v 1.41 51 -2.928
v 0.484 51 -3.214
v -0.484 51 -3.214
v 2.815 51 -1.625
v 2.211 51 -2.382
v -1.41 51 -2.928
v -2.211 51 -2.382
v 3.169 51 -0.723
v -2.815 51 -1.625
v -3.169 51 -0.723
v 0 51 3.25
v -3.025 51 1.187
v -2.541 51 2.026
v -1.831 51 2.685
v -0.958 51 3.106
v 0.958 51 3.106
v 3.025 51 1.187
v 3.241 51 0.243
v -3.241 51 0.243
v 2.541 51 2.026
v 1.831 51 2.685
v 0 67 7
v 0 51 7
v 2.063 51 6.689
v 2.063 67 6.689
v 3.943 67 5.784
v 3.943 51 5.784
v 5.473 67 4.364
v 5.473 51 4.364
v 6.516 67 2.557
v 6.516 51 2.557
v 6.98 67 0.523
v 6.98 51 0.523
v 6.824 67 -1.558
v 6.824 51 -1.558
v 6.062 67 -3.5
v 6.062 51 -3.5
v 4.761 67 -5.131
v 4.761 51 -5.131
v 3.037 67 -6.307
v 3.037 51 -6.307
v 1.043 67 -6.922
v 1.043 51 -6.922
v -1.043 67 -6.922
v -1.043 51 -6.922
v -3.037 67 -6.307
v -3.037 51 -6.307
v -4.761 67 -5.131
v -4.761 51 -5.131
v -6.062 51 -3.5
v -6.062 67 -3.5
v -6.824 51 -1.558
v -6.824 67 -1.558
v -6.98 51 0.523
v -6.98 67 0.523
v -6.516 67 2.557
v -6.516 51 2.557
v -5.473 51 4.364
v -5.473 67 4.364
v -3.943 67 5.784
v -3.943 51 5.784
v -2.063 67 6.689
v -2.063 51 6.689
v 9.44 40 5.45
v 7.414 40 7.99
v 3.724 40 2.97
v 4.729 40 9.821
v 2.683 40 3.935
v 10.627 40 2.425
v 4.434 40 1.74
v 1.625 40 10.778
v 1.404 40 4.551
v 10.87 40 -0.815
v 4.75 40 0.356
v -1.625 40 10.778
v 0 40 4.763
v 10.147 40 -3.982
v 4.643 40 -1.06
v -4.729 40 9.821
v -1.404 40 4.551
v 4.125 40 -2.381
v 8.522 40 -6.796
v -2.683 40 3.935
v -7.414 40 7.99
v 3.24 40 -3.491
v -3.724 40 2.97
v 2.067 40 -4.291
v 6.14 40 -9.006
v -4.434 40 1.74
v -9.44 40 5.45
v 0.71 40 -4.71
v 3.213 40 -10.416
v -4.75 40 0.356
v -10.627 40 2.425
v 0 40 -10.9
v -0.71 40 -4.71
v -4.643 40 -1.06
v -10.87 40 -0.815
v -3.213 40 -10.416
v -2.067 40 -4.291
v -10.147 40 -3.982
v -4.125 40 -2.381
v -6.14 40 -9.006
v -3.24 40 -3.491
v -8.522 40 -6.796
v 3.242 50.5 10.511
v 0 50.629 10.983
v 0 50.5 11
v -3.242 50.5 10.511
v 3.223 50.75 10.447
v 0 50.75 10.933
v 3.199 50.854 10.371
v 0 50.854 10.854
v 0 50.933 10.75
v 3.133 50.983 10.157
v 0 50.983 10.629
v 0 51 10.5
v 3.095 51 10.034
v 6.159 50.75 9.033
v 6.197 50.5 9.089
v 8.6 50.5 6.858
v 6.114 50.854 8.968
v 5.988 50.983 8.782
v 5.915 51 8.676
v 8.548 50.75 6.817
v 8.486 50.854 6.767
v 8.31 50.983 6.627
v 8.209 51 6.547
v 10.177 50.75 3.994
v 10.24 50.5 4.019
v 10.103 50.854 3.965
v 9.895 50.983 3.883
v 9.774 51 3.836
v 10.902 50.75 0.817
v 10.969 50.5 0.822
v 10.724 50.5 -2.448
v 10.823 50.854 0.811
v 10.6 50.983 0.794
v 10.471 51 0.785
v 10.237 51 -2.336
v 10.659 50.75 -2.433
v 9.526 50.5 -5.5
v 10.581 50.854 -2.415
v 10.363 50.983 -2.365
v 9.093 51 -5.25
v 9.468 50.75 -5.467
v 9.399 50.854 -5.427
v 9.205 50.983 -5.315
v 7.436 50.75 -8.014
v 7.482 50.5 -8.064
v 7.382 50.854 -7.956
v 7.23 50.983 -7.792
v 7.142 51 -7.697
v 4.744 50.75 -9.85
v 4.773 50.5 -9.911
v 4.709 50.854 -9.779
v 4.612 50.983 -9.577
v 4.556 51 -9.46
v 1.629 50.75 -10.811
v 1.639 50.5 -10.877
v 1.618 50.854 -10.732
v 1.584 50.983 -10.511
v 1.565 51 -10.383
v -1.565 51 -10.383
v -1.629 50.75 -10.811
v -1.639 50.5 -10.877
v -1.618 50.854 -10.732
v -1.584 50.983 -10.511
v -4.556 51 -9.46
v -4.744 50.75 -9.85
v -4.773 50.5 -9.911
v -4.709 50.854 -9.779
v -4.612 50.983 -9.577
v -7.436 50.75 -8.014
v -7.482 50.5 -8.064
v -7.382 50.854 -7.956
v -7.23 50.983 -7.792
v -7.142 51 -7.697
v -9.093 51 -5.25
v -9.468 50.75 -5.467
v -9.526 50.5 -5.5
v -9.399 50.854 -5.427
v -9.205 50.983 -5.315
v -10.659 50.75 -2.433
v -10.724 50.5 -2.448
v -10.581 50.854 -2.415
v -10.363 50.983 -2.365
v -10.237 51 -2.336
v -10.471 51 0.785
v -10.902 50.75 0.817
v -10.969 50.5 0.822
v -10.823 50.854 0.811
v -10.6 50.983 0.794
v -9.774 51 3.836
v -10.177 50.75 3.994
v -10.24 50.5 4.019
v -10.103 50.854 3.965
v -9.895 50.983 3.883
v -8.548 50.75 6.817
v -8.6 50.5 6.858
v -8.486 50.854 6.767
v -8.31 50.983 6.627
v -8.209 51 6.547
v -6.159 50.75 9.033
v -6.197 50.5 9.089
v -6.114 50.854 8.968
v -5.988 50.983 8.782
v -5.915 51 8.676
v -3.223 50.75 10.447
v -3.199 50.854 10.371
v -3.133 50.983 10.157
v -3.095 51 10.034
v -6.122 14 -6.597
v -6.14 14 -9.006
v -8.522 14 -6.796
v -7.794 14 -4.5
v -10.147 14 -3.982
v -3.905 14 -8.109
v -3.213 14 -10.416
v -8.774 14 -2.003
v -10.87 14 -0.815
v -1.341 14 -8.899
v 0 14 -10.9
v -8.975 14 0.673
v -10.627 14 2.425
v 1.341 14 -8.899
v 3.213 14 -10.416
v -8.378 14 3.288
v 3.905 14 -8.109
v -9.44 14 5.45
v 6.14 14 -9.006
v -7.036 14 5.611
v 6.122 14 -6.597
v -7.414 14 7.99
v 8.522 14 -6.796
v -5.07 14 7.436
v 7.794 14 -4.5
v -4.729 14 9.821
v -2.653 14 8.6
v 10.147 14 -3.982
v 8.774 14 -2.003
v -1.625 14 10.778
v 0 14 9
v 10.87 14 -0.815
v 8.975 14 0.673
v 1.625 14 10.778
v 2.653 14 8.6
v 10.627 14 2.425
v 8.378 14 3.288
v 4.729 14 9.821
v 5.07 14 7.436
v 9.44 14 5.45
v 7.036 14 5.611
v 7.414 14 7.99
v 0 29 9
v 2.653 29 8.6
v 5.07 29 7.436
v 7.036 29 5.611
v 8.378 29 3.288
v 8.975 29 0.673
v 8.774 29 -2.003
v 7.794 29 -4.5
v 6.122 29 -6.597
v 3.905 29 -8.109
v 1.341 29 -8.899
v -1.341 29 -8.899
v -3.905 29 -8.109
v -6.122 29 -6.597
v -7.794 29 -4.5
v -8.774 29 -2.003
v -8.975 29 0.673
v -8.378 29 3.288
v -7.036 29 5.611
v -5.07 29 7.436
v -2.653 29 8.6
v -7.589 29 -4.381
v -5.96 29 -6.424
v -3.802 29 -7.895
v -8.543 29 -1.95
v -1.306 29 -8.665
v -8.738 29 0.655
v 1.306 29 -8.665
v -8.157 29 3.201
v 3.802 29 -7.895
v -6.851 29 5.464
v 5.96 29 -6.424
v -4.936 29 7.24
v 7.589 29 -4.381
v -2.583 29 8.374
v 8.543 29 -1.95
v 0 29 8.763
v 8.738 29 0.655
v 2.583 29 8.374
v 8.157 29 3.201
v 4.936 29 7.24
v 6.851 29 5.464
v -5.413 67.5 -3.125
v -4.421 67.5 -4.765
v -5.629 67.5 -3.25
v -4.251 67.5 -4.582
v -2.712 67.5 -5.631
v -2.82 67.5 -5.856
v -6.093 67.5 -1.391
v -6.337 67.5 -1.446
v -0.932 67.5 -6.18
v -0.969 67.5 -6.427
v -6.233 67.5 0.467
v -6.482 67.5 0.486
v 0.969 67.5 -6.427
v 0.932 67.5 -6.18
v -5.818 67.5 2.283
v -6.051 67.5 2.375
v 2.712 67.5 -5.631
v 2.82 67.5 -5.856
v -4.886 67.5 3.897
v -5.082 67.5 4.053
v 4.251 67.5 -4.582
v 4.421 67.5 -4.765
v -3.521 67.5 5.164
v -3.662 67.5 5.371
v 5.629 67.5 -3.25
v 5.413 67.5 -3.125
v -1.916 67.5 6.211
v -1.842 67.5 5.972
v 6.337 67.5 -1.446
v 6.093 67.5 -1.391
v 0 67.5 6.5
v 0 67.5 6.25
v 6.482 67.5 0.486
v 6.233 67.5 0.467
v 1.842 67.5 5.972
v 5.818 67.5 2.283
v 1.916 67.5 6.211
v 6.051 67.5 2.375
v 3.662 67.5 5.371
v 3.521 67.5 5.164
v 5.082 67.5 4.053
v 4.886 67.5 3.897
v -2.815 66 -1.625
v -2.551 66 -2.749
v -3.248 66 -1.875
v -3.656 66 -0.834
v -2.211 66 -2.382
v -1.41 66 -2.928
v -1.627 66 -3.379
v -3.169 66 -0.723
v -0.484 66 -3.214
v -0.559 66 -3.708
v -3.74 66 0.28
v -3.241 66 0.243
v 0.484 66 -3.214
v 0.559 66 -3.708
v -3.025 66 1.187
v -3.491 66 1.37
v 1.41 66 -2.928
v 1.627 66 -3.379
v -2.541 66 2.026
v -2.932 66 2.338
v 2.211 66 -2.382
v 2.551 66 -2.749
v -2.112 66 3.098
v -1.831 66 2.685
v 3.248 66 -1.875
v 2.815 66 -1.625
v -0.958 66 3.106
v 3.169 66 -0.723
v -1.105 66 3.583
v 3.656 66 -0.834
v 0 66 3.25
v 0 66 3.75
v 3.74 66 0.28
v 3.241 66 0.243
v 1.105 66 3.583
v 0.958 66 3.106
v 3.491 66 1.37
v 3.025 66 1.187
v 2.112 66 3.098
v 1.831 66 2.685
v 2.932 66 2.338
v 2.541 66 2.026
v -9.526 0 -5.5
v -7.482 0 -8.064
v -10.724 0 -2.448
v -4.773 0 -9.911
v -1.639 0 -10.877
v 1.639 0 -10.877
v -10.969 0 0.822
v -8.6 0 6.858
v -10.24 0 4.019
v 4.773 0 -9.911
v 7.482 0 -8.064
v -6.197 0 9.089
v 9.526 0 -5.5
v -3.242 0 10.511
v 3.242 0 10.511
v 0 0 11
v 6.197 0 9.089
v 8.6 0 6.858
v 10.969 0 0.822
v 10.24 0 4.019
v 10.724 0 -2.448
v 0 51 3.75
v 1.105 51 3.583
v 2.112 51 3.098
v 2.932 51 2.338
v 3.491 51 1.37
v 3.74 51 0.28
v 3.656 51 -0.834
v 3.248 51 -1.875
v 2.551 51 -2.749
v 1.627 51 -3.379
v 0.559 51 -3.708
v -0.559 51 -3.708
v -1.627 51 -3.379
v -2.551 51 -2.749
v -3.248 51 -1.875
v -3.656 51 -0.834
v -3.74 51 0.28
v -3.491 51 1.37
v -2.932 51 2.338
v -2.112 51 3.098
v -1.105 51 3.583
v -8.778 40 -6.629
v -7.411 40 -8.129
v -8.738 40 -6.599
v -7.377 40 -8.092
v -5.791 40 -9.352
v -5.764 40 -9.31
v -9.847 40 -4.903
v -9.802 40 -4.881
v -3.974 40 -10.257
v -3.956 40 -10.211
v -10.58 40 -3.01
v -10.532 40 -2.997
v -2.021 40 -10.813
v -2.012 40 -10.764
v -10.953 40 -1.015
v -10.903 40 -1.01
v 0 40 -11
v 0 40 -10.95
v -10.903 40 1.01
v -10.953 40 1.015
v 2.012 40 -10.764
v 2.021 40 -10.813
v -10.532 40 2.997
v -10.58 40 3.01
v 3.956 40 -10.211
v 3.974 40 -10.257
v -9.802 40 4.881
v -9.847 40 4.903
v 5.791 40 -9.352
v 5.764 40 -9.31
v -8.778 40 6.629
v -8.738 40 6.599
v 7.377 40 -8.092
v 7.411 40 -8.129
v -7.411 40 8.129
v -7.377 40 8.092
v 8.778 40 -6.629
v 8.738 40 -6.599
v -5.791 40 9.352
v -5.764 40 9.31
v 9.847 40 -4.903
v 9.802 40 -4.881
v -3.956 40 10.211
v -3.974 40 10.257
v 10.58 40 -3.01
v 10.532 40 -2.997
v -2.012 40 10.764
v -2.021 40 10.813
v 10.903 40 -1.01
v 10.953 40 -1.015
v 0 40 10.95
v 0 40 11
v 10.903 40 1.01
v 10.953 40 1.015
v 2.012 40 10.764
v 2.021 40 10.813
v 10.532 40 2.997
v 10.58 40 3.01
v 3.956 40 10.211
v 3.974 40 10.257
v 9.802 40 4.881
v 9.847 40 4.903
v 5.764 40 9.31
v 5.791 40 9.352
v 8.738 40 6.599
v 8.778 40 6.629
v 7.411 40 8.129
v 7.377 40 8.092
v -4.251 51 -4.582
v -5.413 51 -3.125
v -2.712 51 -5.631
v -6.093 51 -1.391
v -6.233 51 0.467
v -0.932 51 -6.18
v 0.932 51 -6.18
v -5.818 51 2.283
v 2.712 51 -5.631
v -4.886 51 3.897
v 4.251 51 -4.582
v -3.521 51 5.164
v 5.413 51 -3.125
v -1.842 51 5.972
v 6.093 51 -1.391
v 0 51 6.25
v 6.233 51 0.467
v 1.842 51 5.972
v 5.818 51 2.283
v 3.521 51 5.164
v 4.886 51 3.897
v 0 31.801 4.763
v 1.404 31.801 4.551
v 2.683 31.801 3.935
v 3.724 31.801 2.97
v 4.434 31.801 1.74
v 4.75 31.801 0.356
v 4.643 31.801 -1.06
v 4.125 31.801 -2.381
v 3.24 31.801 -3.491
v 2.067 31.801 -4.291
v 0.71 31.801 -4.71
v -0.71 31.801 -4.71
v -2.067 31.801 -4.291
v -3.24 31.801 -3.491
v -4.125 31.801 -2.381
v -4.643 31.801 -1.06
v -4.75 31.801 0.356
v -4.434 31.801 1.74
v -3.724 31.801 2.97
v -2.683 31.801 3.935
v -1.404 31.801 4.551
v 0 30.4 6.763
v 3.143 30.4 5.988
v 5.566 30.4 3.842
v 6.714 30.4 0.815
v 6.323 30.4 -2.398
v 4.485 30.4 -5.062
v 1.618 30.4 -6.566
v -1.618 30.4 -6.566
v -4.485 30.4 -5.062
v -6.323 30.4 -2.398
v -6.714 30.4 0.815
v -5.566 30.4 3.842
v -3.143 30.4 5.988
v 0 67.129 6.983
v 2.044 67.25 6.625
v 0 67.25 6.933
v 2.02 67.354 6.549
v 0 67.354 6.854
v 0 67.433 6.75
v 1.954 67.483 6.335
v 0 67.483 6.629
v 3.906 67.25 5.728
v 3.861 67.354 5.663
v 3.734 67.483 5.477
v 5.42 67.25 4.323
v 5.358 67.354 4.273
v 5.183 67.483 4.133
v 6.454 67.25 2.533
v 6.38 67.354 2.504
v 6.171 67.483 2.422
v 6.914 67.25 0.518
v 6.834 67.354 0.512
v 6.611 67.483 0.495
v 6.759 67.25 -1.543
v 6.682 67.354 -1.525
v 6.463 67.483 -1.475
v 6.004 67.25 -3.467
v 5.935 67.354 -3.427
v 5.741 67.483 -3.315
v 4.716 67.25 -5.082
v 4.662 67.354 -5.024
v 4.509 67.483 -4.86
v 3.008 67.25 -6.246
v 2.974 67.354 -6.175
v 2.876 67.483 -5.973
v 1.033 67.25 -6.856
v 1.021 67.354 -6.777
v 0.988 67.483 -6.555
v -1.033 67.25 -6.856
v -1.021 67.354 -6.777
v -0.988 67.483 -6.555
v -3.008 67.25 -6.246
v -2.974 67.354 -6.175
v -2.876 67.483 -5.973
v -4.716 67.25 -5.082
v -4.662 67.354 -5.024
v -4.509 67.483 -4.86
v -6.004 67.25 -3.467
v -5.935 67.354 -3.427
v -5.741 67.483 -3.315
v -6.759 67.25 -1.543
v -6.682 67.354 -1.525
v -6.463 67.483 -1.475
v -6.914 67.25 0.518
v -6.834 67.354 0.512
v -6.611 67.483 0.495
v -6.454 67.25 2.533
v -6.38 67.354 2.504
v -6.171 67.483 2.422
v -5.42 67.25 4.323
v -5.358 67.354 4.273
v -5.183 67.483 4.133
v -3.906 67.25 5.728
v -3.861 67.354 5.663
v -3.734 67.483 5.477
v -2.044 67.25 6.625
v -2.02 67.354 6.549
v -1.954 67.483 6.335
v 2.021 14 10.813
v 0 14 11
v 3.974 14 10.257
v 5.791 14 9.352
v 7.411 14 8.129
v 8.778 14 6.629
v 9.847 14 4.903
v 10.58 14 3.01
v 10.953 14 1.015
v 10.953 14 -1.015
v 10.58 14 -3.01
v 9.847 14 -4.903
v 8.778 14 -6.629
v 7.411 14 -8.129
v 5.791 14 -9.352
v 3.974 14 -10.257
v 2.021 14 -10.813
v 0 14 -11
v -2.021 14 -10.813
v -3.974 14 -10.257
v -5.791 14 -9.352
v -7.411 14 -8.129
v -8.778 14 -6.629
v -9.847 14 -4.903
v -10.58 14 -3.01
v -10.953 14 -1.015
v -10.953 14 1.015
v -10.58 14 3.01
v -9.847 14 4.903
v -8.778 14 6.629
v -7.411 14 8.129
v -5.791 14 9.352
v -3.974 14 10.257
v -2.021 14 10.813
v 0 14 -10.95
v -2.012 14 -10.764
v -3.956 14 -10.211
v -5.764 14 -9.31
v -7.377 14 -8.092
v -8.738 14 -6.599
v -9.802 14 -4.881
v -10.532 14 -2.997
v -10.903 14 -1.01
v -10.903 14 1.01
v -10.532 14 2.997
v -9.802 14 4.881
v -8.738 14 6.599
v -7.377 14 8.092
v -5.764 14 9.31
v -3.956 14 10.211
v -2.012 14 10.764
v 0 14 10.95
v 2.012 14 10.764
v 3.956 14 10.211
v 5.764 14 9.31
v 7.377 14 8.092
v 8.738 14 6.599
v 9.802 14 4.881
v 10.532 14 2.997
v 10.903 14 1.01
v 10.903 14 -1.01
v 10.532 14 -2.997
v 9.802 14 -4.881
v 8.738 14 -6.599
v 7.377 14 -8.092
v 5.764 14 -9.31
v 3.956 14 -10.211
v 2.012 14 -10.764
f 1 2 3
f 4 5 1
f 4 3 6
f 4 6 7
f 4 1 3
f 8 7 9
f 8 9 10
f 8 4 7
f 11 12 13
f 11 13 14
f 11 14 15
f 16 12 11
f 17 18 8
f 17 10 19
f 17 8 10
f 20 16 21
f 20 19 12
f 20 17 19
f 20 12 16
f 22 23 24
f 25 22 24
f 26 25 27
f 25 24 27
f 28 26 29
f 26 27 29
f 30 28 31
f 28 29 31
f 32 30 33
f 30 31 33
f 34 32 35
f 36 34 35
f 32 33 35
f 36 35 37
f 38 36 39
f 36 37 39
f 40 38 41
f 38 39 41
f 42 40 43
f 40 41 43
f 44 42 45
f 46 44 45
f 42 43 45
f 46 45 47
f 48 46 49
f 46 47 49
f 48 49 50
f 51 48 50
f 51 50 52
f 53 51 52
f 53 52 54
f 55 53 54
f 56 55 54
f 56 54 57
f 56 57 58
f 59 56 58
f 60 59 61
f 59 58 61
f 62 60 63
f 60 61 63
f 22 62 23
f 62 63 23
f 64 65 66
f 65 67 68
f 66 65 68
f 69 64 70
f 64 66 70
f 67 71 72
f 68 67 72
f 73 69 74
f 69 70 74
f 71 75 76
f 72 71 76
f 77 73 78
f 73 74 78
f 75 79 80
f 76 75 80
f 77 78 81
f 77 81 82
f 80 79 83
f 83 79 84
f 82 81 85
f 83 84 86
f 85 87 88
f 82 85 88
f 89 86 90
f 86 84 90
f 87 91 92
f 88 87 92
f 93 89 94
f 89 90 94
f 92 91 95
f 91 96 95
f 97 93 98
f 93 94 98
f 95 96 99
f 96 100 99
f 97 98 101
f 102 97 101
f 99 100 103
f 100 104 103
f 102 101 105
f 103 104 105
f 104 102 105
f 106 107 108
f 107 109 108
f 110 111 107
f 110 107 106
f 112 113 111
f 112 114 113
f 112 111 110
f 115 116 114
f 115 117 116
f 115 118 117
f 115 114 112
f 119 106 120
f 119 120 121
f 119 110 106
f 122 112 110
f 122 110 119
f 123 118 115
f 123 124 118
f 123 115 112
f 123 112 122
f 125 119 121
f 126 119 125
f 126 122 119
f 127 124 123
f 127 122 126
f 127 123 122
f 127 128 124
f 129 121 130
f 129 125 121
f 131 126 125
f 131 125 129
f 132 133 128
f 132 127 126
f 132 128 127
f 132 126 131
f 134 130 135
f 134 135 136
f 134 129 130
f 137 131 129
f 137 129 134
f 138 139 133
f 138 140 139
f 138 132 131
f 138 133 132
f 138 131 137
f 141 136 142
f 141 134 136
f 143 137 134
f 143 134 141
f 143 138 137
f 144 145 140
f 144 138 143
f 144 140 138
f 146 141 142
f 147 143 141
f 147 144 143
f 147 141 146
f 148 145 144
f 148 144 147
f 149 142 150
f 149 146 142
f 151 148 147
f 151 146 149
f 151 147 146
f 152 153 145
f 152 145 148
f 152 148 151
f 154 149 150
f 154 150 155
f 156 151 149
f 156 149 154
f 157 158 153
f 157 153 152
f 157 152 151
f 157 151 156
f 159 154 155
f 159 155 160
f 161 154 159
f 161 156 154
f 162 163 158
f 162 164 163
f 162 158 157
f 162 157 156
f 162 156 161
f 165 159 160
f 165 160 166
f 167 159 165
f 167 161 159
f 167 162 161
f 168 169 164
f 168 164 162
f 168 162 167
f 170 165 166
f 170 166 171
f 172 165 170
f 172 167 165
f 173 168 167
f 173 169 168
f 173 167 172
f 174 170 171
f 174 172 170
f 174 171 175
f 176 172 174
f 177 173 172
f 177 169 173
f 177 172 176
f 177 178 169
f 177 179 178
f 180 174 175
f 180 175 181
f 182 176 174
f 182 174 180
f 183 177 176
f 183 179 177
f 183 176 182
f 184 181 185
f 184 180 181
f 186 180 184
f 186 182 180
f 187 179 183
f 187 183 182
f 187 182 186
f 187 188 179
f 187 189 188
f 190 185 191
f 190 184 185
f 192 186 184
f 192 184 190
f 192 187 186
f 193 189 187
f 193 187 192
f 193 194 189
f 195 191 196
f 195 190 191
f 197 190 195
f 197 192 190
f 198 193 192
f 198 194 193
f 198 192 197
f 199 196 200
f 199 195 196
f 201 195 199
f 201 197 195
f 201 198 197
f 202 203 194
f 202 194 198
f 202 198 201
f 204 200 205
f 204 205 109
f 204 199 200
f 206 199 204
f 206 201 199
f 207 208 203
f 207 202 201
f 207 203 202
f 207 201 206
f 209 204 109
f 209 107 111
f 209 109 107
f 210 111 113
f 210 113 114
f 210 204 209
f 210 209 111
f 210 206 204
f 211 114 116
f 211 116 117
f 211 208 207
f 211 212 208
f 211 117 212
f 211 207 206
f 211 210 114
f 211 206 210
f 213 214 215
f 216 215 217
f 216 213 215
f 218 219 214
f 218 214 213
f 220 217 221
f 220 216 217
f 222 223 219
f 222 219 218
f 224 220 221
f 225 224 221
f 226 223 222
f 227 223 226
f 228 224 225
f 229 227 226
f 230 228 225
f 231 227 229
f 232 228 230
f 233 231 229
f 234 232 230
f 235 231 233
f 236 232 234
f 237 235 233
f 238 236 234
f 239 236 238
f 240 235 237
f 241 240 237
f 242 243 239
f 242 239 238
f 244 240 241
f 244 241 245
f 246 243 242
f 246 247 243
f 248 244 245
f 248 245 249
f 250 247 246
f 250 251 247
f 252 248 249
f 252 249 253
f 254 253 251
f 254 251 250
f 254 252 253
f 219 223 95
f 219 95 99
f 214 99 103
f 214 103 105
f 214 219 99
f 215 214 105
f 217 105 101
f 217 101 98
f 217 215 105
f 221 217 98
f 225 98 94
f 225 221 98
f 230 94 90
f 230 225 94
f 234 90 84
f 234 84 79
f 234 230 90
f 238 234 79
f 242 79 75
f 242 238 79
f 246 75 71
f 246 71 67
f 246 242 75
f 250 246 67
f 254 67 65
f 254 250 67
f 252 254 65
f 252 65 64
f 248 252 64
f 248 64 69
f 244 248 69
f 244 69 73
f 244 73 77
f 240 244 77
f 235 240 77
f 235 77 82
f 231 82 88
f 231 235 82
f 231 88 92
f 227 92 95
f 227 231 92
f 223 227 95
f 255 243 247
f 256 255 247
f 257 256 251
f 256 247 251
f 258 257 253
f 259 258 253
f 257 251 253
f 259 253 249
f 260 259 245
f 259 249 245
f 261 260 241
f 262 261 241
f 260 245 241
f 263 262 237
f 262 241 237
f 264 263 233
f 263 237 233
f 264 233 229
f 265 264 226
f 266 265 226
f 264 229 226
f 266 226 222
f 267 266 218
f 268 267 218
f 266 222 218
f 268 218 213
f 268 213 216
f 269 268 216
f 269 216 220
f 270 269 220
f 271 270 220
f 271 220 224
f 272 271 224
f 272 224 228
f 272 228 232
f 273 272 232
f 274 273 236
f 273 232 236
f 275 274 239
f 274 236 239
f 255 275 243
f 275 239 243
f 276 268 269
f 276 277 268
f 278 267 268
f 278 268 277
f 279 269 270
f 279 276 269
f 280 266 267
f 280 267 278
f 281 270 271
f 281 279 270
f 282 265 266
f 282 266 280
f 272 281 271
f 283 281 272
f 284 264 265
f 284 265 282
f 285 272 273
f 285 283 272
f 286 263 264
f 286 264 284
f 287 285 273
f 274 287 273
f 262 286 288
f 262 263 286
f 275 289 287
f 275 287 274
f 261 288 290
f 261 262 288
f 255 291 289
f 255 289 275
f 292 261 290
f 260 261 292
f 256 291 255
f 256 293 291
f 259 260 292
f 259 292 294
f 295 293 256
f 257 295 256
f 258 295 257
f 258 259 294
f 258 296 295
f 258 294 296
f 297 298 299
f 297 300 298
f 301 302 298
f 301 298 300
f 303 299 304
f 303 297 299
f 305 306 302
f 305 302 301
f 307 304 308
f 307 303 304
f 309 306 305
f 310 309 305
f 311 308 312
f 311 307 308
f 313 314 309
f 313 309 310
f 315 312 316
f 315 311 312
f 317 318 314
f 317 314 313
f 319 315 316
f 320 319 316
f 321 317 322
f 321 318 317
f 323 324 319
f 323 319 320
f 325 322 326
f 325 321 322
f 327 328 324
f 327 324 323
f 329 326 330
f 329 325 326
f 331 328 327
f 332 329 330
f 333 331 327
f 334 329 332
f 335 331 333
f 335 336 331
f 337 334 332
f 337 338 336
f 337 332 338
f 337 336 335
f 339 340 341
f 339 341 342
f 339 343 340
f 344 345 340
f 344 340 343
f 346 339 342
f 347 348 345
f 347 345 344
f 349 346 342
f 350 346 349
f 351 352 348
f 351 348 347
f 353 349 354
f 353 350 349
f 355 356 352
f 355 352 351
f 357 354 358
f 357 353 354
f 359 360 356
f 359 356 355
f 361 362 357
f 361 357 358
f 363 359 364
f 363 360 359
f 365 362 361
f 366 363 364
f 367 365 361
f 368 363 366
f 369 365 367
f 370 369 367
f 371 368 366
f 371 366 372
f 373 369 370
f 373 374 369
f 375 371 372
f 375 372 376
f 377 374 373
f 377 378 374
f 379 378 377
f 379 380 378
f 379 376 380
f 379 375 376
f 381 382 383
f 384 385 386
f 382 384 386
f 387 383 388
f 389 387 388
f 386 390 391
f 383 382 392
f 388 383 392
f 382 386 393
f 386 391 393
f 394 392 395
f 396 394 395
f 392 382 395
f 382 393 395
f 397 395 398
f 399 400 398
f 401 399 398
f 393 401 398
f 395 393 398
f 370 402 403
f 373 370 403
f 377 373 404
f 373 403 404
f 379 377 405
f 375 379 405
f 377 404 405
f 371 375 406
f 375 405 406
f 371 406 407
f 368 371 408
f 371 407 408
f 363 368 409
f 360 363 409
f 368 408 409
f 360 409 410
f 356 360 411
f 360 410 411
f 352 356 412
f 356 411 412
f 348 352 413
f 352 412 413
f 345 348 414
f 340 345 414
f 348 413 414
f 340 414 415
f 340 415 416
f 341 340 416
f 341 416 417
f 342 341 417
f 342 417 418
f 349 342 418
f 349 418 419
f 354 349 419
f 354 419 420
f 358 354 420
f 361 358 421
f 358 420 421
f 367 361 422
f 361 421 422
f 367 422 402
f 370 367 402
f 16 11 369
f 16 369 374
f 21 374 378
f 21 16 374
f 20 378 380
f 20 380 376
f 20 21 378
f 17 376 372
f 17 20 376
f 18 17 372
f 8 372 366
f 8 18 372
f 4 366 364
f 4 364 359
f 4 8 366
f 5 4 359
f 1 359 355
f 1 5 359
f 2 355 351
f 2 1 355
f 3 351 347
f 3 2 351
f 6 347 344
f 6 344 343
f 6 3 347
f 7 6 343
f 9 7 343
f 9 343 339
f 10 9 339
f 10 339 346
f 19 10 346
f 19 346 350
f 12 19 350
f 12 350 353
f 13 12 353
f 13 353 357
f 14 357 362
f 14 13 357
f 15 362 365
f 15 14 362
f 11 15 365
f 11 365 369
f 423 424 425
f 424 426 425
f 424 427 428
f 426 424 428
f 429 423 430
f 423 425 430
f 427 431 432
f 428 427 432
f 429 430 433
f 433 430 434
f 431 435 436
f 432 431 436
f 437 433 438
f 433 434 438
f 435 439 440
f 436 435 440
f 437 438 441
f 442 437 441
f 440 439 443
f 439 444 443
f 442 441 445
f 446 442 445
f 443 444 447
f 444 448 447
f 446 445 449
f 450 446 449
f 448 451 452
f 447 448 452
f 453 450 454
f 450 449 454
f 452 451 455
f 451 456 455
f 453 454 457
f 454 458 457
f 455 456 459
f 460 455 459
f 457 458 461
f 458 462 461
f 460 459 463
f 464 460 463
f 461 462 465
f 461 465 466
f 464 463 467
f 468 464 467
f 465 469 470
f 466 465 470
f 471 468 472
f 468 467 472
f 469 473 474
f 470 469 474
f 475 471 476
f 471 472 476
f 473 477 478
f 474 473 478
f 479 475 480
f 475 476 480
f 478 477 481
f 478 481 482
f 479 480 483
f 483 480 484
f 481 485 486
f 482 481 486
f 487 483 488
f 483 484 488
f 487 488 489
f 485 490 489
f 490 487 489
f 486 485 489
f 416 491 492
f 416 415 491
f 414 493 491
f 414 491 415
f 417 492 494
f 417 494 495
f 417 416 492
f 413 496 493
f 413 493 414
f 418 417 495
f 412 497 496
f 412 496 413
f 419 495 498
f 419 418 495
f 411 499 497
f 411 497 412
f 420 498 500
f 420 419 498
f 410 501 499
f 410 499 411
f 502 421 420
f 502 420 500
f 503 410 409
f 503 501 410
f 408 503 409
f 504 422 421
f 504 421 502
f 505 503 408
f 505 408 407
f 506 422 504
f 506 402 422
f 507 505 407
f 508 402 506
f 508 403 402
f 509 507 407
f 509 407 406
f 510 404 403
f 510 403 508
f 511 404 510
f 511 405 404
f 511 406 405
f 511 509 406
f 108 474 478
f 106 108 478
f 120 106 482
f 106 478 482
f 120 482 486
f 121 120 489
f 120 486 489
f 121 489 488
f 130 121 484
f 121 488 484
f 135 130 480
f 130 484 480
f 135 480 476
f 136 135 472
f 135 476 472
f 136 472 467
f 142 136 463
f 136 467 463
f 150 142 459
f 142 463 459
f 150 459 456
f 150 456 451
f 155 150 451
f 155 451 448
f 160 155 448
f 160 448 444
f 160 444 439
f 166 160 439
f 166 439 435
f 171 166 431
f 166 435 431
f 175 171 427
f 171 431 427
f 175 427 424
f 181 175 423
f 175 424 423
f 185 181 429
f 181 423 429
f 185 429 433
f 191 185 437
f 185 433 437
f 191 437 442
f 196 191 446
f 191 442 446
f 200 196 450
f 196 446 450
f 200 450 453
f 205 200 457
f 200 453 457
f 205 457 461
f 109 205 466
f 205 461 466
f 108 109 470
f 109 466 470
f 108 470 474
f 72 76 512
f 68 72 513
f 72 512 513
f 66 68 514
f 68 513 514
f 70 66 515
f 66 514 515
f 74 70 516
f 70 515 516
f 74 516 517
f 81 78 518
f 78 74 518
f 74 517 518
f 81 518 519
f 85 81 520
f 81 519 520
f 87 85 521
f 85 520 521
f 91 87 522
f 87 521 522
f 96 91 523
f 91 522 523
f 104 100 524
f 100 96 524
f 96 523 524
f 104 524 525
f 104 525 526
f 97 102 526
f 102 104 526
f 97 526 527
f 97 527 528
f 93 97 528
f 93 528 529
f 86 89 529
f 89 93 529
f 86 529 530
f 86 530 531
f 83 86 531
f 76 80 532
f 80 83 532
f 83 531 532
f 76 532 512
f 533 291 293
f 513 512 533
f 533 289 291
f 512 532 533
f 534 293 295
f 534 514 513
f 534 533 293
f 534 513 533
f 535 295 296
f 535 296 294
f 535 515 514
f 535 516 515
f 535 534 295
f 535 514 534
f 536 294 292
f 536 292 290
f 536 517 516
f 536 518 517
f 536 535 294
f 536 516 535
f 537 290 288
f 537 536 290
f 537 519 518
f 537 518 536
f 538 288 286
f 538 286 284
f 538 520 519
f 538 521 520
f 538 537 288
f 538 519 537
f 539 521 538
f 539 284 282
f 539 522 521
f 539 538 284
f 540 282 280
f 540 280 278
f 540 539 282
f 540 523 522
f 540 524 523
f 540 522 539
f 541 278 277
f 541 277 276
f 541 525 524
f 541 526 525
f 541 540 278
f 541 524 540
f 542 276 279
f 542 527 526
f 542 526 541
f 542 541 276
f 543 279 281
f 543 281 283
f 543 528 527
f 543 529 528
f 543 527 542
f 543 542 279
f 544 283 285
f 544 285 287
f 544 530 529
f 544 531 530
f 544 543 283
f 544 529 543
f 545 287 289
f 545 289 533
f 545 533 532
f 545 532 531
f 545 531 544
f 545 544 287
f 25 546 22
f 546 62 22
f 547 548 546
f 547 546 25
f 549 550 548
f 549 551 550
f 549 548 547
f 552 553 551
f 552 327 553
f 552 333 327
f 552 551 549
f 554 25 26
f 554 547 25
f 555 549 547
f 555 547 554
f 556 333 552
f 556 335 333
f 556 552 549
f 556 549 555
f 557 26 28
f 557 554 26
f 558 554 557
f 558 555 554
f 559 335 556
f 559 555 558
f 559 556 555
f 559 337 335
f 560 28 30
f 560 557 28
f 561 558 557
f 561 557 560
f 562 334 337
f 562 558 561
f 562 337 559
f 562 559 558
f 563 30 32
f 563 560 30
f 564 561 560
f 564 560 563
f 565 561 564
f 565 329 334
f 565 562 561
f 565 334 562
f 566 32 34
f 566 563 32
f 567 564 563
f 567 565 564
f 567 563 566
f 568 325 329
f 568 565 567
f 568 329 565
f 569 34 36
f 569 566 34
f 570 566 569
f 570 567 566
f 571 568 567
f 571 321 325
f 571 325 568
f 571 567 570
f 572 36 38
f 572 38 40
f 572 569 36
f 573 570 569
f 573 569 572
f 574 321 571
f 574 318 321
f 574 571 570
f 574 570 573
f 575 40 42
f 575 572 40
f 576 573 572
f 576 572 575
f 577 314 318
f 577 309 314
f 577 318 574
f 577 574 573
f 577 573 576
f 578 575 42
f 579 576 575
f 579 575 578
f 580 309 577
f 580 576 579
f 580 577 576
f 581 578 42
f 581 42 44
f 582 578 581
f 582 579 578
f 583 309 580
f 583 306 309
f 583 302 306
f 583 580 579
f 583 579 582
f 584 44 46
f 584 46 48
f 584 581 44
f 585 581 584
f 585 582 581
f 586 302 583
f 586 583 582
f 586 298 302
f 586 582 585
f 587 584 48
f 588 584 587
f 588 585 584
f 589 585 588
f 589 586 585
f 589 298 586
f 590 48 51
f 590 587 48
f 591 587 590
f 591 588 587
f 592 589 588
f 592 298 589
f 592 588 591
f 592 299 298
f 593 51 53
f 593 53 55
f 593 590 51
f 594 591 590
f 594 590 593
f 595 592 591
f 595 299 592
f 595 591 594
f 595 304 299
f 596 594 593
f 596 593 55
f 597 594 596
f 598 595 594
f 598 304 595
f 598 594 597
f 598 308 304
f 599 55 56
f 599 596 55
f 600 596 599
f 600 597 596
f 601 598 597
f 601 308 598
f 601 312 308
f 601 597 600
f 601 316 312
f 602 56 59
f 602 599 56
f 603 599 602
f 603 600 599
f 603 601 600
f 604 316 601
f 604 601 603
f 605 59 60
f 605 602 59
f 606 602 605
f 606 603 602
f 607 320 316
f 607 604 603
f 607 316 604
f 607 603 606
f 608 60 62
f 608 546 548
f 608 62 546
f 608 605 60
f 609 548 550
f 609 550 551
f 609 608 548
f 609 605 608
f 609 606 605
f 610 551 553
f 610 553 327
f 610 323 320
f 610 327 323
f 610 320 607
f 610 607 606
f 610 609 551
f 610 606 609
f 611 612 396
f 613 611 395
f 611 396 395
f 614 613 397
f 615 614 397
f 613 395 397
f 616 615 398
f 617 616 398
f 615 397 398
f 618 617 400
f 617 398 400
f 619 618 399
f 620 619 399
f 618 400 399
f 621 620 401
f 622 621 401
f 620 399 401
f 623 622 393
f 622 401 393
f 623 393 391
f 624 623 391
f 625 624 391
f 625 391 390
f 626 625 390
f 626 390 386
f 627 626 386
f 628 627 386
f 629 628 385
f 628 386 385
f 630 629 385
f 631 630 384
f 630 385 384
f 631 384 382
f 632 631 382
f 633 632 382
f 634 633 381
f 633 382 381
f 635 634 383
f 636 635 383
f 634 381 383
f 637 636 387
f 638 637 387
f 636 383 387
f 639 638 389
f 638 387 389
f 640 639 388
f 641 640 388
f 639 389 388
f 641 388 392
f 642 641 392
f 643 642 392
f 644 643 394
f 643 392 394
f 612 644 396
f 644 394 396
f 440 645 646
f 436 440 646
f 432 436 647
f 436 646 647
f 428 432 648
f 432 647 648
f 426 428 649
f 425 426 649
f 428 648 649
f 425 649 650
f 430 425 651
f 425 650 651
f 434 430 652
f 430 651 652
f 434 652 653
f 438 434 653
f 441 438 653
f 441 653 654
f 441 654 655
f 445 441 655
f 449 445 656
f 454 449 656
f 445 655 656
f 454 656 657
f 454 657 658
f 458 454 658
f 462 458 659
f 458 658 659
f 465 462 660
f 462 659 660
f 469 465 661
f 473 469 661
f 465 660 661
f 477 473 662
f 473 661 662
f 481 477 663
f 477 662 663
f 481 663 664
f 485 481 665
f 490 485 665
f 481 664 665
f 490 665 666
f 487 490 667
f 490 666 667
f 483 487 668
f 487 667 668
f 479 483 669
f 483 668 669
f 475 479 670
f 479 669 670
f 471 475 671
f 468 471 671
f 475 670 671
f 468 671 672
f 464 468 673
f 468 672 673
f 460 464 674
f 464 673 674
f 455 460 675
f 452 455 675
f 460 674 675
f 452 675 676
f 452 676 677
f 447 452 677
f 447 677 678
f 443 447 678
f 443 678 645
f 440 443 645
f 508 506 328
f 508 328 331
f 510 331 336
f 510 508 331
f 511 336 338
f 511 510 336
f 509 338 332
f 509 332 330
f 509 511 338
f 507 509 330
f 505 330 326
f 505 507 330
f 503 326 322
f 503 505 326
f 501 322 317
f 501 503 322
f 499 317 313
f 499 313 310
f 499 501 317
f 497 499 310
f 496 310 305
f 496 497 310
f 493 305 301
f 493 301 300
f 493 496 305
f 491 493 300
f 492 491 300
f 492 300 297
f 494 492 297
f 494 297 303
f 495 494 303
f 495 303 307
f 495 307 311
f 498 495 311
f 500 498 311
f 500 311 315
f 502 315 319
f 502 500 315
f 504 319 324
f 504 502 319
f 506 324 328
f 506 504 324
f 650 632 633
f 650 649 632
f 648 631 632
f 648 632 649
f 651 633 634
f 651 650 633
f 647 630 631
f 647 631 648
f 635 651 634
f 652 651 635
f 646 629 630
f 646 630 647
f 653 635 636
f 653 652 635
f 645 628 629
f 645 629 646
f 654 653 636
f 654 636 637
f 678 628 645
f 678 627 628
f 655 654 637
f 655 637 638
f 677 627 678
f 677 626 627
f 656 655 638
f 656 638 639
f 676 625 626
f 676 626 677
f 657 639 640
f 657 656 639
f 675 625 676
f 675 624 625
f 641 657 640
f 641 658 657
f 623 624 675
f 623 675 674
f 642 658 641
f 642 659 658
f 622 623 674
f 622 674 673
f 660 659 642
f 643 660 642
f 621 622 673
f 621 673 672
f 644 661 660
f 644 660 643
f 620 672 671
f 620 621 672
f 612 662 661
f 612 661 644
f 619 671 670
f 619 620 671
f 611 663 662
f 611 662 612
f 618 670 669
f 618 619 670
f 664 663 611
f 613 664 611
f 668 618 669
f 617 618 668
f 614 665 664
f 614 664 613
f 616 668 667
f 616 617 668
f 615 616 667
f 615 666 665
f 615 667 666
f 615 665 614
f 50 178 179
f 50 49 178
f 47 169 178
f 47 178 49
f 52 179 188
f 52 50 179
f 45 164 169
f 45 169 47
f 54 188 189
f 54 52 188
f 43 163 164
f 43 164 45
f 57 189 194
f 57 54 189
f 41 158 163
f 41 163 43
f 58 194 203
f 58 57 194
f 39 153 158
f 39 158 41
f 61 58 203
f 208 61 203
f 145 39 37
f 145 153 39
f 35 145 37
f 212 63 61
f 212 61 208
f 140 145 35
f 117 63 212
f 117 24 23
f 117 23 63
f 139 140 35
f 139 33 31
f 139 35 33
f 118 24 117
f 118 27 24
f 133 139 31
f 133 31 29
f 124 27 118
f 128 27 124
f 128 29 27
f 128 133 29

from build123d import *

# Parameters (mm, degrees)
SKETCH_1_R       = 11
EXTRUDE_1_DEPTH  = 14
SKETCH_3_R       = 10.95
SKETCH_3_R_2     = 10.9
EXTRUDE_6_DEPTH  = 26
SKETCH_5_R       = 11
EXTRUDE_7_DEPTH  = 11
SKETCH_6_R       = 7
SKETCH_6_R_2     = 6.25
EXTRUDE_8_DEPTH  = 16.5
SKETCH_6_3_R     = 3.75
SKETCH_6_3_R_2   = 3.25
EXTRUDE_9_DEPTH  = 15
FILLET_1_R       = 0.5
FILLET_2_R       = 0.5
SKETCH_8_R       = 9
EXTRUDE_10_DEPTH = 15
SKETCH_9_R       = 4.762822891
EXTRUDE_11_DEPTH = 15
CHAMFER_1_SIZE   = 4
CHAMFER_1_SIZE2  = 2.800830153


with BuildPart() as part:
    # Эскиз1 → Бобышка-Вытянуть1 (new body)
    with BuildSketch(Plane(origin=(0, 0, 0), x_dir=(1, 0, 0), z_dir=(0, 1, 0))):
        Circle(SKETCH_1_R)
    extrude(amount=EXTRUDE_1_DEPTH)

    # Эскиз3 → Бобышка-Вытянуть6 (add)
    with BuildSketch(Plane(origin=(0, 14, 0), x_dir=(1, 0, 0), z_dir=(0, 1, 0))):
        Circle(SKETCH_3_R)
        Circle(SKETCH_3_R_2, mode=Mode.SUBTRACT)
    extrude(amount=EXTRUDE_6_DEPTH)

    # Эскиз5 → Бобышка-Вытянуть7 (add)
    with BuildSketch(Plane(origin=(0, 40, 0), x_dir=(1, 0, 0), z_dir=(0, 1, 0))):
        Circle(SKETCH_5_R)
    extrude(amount=EXTRUDE_7_DEPTH)

    # Эскиз6 → Бобышка-Вытянуть8 (add)
    with BuildSketch(Plane(origin=(0, 51, 0), x_dir=(1, 0, 0), z_dir=(0, 1, 0))):
        Circle(SKETCH_6_R)
        Circle(SKETCH_6_R_2, mode=Mode.SUBTRACT)
    extrude(amount=EXTRUDE_8_DEPTH)

    # Эскиз6<3> → Бобышка-Вытянуть9 (add)
    with BuildSketch(Plane(origin=(0, 51, 0), x_dir=(1, 0, 0), z_dir=(0, 1, 0))):
        Circle(SKETCH_6_3_R)
        Circle(SKETCH_6_3_R_2, mode=Mode.SUBTRACT)
    extrude(amount=EXTRUDE_9_DEPTH)

    # Скругление1
    fillet_1_edges = [part.edges().sort_by_distance(p)[0] for p in [
        (-11, 51, 0),
    ]]
    fillet(fillet_1_edges, radius=FILLET_1_R)

    # Скругление2
    fillet_2_edges = [part.edges().sort_by_distance(p)[0] for p in [
        (-7, 67.5, 0),
    ]]
    fillet(fillet_2_edges, radius=FILLET_2_R)

    # Эскиз8 → Бобышка-Вытянуть10 (add)
    with BuildSketch(Plane(origin=(0, 14, 0), x_dir=(1, 0, 0), z_dir=(0, 1, 0))):
        Circle(SKETCH_8_R)
    extrude(amount=EXTRUDE_10_DEPTH)

    # Эскиз9 → Бобышка-Вытянуть11 (add)
    with BuildSketch(Plane(origin=(0, 29, 0), x_dir=(1, 0, 0), z_dir=(0, 1, 0))):
        Circle(SKETCH_9_R)
    extrude(amount=EXTRUDE_11_DEPTH)

    # Фаска1
    chamfer_1_edges = [part.edges().sort_by_distance(p)[0] for p in [
        (-4.762822891, 29, 0),
    ]]
    chamfer_1_side = [part.faces().sort_by_distance(p)[0] for p in [
        (-8.745441559, 29, 0),
    ]]
    chamfer(chamfer_1_edges, length=CHAMFER_1_SIZE, length2=CHAMFER_1_SIZE2, reference=chamfer_1_side[0])


solid = part.part
